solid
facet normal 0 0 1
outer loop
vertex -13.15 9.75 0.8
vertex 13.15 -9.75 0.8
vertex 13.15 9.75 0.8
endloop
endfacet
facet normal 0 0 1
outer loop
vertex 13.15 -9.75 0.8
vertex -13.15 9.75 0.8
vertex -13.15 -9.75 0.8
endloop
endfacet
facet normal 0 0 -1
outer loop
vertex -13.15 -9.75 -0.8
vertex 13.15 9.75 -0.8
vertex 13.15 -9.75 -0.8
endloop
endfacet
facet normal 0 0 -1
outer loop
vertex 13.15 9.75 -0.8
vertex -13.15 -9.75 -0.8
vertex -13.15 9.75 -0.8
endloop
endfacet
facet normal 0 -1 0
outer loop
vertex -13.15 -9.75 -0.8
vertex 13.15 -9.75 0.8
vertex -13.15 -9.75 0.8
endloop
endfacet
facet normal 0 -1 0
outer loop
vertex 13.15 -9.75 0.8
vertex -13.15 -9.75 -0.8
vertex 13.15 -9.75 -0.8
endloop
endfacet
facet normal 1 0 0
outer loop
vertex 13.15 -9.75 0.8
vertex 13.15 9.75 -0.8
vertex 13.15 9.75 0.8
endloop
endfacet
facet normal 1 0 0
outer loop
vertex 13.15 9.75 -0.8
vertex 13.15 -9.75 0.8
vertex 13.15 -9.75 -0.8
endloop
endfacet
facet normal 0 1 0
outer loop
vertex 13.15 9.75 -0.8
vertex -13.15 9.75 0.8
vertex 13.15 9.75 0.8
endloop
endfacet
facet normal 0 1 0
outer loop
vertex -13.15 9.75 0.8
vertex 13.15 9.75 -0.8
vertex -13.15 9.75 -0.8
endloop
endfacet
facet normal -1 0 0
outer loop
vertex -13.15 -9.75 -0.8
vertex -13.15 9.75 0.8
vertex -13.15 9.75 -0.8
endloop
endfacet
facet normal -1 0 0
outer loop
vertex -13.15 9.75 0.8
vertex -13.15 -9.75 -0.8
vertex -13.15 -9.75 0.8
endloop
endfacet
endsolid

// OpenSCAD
translate([-13.15, -9.75, -0.8])
    cube([26.3, 19.5, 1.6]);
